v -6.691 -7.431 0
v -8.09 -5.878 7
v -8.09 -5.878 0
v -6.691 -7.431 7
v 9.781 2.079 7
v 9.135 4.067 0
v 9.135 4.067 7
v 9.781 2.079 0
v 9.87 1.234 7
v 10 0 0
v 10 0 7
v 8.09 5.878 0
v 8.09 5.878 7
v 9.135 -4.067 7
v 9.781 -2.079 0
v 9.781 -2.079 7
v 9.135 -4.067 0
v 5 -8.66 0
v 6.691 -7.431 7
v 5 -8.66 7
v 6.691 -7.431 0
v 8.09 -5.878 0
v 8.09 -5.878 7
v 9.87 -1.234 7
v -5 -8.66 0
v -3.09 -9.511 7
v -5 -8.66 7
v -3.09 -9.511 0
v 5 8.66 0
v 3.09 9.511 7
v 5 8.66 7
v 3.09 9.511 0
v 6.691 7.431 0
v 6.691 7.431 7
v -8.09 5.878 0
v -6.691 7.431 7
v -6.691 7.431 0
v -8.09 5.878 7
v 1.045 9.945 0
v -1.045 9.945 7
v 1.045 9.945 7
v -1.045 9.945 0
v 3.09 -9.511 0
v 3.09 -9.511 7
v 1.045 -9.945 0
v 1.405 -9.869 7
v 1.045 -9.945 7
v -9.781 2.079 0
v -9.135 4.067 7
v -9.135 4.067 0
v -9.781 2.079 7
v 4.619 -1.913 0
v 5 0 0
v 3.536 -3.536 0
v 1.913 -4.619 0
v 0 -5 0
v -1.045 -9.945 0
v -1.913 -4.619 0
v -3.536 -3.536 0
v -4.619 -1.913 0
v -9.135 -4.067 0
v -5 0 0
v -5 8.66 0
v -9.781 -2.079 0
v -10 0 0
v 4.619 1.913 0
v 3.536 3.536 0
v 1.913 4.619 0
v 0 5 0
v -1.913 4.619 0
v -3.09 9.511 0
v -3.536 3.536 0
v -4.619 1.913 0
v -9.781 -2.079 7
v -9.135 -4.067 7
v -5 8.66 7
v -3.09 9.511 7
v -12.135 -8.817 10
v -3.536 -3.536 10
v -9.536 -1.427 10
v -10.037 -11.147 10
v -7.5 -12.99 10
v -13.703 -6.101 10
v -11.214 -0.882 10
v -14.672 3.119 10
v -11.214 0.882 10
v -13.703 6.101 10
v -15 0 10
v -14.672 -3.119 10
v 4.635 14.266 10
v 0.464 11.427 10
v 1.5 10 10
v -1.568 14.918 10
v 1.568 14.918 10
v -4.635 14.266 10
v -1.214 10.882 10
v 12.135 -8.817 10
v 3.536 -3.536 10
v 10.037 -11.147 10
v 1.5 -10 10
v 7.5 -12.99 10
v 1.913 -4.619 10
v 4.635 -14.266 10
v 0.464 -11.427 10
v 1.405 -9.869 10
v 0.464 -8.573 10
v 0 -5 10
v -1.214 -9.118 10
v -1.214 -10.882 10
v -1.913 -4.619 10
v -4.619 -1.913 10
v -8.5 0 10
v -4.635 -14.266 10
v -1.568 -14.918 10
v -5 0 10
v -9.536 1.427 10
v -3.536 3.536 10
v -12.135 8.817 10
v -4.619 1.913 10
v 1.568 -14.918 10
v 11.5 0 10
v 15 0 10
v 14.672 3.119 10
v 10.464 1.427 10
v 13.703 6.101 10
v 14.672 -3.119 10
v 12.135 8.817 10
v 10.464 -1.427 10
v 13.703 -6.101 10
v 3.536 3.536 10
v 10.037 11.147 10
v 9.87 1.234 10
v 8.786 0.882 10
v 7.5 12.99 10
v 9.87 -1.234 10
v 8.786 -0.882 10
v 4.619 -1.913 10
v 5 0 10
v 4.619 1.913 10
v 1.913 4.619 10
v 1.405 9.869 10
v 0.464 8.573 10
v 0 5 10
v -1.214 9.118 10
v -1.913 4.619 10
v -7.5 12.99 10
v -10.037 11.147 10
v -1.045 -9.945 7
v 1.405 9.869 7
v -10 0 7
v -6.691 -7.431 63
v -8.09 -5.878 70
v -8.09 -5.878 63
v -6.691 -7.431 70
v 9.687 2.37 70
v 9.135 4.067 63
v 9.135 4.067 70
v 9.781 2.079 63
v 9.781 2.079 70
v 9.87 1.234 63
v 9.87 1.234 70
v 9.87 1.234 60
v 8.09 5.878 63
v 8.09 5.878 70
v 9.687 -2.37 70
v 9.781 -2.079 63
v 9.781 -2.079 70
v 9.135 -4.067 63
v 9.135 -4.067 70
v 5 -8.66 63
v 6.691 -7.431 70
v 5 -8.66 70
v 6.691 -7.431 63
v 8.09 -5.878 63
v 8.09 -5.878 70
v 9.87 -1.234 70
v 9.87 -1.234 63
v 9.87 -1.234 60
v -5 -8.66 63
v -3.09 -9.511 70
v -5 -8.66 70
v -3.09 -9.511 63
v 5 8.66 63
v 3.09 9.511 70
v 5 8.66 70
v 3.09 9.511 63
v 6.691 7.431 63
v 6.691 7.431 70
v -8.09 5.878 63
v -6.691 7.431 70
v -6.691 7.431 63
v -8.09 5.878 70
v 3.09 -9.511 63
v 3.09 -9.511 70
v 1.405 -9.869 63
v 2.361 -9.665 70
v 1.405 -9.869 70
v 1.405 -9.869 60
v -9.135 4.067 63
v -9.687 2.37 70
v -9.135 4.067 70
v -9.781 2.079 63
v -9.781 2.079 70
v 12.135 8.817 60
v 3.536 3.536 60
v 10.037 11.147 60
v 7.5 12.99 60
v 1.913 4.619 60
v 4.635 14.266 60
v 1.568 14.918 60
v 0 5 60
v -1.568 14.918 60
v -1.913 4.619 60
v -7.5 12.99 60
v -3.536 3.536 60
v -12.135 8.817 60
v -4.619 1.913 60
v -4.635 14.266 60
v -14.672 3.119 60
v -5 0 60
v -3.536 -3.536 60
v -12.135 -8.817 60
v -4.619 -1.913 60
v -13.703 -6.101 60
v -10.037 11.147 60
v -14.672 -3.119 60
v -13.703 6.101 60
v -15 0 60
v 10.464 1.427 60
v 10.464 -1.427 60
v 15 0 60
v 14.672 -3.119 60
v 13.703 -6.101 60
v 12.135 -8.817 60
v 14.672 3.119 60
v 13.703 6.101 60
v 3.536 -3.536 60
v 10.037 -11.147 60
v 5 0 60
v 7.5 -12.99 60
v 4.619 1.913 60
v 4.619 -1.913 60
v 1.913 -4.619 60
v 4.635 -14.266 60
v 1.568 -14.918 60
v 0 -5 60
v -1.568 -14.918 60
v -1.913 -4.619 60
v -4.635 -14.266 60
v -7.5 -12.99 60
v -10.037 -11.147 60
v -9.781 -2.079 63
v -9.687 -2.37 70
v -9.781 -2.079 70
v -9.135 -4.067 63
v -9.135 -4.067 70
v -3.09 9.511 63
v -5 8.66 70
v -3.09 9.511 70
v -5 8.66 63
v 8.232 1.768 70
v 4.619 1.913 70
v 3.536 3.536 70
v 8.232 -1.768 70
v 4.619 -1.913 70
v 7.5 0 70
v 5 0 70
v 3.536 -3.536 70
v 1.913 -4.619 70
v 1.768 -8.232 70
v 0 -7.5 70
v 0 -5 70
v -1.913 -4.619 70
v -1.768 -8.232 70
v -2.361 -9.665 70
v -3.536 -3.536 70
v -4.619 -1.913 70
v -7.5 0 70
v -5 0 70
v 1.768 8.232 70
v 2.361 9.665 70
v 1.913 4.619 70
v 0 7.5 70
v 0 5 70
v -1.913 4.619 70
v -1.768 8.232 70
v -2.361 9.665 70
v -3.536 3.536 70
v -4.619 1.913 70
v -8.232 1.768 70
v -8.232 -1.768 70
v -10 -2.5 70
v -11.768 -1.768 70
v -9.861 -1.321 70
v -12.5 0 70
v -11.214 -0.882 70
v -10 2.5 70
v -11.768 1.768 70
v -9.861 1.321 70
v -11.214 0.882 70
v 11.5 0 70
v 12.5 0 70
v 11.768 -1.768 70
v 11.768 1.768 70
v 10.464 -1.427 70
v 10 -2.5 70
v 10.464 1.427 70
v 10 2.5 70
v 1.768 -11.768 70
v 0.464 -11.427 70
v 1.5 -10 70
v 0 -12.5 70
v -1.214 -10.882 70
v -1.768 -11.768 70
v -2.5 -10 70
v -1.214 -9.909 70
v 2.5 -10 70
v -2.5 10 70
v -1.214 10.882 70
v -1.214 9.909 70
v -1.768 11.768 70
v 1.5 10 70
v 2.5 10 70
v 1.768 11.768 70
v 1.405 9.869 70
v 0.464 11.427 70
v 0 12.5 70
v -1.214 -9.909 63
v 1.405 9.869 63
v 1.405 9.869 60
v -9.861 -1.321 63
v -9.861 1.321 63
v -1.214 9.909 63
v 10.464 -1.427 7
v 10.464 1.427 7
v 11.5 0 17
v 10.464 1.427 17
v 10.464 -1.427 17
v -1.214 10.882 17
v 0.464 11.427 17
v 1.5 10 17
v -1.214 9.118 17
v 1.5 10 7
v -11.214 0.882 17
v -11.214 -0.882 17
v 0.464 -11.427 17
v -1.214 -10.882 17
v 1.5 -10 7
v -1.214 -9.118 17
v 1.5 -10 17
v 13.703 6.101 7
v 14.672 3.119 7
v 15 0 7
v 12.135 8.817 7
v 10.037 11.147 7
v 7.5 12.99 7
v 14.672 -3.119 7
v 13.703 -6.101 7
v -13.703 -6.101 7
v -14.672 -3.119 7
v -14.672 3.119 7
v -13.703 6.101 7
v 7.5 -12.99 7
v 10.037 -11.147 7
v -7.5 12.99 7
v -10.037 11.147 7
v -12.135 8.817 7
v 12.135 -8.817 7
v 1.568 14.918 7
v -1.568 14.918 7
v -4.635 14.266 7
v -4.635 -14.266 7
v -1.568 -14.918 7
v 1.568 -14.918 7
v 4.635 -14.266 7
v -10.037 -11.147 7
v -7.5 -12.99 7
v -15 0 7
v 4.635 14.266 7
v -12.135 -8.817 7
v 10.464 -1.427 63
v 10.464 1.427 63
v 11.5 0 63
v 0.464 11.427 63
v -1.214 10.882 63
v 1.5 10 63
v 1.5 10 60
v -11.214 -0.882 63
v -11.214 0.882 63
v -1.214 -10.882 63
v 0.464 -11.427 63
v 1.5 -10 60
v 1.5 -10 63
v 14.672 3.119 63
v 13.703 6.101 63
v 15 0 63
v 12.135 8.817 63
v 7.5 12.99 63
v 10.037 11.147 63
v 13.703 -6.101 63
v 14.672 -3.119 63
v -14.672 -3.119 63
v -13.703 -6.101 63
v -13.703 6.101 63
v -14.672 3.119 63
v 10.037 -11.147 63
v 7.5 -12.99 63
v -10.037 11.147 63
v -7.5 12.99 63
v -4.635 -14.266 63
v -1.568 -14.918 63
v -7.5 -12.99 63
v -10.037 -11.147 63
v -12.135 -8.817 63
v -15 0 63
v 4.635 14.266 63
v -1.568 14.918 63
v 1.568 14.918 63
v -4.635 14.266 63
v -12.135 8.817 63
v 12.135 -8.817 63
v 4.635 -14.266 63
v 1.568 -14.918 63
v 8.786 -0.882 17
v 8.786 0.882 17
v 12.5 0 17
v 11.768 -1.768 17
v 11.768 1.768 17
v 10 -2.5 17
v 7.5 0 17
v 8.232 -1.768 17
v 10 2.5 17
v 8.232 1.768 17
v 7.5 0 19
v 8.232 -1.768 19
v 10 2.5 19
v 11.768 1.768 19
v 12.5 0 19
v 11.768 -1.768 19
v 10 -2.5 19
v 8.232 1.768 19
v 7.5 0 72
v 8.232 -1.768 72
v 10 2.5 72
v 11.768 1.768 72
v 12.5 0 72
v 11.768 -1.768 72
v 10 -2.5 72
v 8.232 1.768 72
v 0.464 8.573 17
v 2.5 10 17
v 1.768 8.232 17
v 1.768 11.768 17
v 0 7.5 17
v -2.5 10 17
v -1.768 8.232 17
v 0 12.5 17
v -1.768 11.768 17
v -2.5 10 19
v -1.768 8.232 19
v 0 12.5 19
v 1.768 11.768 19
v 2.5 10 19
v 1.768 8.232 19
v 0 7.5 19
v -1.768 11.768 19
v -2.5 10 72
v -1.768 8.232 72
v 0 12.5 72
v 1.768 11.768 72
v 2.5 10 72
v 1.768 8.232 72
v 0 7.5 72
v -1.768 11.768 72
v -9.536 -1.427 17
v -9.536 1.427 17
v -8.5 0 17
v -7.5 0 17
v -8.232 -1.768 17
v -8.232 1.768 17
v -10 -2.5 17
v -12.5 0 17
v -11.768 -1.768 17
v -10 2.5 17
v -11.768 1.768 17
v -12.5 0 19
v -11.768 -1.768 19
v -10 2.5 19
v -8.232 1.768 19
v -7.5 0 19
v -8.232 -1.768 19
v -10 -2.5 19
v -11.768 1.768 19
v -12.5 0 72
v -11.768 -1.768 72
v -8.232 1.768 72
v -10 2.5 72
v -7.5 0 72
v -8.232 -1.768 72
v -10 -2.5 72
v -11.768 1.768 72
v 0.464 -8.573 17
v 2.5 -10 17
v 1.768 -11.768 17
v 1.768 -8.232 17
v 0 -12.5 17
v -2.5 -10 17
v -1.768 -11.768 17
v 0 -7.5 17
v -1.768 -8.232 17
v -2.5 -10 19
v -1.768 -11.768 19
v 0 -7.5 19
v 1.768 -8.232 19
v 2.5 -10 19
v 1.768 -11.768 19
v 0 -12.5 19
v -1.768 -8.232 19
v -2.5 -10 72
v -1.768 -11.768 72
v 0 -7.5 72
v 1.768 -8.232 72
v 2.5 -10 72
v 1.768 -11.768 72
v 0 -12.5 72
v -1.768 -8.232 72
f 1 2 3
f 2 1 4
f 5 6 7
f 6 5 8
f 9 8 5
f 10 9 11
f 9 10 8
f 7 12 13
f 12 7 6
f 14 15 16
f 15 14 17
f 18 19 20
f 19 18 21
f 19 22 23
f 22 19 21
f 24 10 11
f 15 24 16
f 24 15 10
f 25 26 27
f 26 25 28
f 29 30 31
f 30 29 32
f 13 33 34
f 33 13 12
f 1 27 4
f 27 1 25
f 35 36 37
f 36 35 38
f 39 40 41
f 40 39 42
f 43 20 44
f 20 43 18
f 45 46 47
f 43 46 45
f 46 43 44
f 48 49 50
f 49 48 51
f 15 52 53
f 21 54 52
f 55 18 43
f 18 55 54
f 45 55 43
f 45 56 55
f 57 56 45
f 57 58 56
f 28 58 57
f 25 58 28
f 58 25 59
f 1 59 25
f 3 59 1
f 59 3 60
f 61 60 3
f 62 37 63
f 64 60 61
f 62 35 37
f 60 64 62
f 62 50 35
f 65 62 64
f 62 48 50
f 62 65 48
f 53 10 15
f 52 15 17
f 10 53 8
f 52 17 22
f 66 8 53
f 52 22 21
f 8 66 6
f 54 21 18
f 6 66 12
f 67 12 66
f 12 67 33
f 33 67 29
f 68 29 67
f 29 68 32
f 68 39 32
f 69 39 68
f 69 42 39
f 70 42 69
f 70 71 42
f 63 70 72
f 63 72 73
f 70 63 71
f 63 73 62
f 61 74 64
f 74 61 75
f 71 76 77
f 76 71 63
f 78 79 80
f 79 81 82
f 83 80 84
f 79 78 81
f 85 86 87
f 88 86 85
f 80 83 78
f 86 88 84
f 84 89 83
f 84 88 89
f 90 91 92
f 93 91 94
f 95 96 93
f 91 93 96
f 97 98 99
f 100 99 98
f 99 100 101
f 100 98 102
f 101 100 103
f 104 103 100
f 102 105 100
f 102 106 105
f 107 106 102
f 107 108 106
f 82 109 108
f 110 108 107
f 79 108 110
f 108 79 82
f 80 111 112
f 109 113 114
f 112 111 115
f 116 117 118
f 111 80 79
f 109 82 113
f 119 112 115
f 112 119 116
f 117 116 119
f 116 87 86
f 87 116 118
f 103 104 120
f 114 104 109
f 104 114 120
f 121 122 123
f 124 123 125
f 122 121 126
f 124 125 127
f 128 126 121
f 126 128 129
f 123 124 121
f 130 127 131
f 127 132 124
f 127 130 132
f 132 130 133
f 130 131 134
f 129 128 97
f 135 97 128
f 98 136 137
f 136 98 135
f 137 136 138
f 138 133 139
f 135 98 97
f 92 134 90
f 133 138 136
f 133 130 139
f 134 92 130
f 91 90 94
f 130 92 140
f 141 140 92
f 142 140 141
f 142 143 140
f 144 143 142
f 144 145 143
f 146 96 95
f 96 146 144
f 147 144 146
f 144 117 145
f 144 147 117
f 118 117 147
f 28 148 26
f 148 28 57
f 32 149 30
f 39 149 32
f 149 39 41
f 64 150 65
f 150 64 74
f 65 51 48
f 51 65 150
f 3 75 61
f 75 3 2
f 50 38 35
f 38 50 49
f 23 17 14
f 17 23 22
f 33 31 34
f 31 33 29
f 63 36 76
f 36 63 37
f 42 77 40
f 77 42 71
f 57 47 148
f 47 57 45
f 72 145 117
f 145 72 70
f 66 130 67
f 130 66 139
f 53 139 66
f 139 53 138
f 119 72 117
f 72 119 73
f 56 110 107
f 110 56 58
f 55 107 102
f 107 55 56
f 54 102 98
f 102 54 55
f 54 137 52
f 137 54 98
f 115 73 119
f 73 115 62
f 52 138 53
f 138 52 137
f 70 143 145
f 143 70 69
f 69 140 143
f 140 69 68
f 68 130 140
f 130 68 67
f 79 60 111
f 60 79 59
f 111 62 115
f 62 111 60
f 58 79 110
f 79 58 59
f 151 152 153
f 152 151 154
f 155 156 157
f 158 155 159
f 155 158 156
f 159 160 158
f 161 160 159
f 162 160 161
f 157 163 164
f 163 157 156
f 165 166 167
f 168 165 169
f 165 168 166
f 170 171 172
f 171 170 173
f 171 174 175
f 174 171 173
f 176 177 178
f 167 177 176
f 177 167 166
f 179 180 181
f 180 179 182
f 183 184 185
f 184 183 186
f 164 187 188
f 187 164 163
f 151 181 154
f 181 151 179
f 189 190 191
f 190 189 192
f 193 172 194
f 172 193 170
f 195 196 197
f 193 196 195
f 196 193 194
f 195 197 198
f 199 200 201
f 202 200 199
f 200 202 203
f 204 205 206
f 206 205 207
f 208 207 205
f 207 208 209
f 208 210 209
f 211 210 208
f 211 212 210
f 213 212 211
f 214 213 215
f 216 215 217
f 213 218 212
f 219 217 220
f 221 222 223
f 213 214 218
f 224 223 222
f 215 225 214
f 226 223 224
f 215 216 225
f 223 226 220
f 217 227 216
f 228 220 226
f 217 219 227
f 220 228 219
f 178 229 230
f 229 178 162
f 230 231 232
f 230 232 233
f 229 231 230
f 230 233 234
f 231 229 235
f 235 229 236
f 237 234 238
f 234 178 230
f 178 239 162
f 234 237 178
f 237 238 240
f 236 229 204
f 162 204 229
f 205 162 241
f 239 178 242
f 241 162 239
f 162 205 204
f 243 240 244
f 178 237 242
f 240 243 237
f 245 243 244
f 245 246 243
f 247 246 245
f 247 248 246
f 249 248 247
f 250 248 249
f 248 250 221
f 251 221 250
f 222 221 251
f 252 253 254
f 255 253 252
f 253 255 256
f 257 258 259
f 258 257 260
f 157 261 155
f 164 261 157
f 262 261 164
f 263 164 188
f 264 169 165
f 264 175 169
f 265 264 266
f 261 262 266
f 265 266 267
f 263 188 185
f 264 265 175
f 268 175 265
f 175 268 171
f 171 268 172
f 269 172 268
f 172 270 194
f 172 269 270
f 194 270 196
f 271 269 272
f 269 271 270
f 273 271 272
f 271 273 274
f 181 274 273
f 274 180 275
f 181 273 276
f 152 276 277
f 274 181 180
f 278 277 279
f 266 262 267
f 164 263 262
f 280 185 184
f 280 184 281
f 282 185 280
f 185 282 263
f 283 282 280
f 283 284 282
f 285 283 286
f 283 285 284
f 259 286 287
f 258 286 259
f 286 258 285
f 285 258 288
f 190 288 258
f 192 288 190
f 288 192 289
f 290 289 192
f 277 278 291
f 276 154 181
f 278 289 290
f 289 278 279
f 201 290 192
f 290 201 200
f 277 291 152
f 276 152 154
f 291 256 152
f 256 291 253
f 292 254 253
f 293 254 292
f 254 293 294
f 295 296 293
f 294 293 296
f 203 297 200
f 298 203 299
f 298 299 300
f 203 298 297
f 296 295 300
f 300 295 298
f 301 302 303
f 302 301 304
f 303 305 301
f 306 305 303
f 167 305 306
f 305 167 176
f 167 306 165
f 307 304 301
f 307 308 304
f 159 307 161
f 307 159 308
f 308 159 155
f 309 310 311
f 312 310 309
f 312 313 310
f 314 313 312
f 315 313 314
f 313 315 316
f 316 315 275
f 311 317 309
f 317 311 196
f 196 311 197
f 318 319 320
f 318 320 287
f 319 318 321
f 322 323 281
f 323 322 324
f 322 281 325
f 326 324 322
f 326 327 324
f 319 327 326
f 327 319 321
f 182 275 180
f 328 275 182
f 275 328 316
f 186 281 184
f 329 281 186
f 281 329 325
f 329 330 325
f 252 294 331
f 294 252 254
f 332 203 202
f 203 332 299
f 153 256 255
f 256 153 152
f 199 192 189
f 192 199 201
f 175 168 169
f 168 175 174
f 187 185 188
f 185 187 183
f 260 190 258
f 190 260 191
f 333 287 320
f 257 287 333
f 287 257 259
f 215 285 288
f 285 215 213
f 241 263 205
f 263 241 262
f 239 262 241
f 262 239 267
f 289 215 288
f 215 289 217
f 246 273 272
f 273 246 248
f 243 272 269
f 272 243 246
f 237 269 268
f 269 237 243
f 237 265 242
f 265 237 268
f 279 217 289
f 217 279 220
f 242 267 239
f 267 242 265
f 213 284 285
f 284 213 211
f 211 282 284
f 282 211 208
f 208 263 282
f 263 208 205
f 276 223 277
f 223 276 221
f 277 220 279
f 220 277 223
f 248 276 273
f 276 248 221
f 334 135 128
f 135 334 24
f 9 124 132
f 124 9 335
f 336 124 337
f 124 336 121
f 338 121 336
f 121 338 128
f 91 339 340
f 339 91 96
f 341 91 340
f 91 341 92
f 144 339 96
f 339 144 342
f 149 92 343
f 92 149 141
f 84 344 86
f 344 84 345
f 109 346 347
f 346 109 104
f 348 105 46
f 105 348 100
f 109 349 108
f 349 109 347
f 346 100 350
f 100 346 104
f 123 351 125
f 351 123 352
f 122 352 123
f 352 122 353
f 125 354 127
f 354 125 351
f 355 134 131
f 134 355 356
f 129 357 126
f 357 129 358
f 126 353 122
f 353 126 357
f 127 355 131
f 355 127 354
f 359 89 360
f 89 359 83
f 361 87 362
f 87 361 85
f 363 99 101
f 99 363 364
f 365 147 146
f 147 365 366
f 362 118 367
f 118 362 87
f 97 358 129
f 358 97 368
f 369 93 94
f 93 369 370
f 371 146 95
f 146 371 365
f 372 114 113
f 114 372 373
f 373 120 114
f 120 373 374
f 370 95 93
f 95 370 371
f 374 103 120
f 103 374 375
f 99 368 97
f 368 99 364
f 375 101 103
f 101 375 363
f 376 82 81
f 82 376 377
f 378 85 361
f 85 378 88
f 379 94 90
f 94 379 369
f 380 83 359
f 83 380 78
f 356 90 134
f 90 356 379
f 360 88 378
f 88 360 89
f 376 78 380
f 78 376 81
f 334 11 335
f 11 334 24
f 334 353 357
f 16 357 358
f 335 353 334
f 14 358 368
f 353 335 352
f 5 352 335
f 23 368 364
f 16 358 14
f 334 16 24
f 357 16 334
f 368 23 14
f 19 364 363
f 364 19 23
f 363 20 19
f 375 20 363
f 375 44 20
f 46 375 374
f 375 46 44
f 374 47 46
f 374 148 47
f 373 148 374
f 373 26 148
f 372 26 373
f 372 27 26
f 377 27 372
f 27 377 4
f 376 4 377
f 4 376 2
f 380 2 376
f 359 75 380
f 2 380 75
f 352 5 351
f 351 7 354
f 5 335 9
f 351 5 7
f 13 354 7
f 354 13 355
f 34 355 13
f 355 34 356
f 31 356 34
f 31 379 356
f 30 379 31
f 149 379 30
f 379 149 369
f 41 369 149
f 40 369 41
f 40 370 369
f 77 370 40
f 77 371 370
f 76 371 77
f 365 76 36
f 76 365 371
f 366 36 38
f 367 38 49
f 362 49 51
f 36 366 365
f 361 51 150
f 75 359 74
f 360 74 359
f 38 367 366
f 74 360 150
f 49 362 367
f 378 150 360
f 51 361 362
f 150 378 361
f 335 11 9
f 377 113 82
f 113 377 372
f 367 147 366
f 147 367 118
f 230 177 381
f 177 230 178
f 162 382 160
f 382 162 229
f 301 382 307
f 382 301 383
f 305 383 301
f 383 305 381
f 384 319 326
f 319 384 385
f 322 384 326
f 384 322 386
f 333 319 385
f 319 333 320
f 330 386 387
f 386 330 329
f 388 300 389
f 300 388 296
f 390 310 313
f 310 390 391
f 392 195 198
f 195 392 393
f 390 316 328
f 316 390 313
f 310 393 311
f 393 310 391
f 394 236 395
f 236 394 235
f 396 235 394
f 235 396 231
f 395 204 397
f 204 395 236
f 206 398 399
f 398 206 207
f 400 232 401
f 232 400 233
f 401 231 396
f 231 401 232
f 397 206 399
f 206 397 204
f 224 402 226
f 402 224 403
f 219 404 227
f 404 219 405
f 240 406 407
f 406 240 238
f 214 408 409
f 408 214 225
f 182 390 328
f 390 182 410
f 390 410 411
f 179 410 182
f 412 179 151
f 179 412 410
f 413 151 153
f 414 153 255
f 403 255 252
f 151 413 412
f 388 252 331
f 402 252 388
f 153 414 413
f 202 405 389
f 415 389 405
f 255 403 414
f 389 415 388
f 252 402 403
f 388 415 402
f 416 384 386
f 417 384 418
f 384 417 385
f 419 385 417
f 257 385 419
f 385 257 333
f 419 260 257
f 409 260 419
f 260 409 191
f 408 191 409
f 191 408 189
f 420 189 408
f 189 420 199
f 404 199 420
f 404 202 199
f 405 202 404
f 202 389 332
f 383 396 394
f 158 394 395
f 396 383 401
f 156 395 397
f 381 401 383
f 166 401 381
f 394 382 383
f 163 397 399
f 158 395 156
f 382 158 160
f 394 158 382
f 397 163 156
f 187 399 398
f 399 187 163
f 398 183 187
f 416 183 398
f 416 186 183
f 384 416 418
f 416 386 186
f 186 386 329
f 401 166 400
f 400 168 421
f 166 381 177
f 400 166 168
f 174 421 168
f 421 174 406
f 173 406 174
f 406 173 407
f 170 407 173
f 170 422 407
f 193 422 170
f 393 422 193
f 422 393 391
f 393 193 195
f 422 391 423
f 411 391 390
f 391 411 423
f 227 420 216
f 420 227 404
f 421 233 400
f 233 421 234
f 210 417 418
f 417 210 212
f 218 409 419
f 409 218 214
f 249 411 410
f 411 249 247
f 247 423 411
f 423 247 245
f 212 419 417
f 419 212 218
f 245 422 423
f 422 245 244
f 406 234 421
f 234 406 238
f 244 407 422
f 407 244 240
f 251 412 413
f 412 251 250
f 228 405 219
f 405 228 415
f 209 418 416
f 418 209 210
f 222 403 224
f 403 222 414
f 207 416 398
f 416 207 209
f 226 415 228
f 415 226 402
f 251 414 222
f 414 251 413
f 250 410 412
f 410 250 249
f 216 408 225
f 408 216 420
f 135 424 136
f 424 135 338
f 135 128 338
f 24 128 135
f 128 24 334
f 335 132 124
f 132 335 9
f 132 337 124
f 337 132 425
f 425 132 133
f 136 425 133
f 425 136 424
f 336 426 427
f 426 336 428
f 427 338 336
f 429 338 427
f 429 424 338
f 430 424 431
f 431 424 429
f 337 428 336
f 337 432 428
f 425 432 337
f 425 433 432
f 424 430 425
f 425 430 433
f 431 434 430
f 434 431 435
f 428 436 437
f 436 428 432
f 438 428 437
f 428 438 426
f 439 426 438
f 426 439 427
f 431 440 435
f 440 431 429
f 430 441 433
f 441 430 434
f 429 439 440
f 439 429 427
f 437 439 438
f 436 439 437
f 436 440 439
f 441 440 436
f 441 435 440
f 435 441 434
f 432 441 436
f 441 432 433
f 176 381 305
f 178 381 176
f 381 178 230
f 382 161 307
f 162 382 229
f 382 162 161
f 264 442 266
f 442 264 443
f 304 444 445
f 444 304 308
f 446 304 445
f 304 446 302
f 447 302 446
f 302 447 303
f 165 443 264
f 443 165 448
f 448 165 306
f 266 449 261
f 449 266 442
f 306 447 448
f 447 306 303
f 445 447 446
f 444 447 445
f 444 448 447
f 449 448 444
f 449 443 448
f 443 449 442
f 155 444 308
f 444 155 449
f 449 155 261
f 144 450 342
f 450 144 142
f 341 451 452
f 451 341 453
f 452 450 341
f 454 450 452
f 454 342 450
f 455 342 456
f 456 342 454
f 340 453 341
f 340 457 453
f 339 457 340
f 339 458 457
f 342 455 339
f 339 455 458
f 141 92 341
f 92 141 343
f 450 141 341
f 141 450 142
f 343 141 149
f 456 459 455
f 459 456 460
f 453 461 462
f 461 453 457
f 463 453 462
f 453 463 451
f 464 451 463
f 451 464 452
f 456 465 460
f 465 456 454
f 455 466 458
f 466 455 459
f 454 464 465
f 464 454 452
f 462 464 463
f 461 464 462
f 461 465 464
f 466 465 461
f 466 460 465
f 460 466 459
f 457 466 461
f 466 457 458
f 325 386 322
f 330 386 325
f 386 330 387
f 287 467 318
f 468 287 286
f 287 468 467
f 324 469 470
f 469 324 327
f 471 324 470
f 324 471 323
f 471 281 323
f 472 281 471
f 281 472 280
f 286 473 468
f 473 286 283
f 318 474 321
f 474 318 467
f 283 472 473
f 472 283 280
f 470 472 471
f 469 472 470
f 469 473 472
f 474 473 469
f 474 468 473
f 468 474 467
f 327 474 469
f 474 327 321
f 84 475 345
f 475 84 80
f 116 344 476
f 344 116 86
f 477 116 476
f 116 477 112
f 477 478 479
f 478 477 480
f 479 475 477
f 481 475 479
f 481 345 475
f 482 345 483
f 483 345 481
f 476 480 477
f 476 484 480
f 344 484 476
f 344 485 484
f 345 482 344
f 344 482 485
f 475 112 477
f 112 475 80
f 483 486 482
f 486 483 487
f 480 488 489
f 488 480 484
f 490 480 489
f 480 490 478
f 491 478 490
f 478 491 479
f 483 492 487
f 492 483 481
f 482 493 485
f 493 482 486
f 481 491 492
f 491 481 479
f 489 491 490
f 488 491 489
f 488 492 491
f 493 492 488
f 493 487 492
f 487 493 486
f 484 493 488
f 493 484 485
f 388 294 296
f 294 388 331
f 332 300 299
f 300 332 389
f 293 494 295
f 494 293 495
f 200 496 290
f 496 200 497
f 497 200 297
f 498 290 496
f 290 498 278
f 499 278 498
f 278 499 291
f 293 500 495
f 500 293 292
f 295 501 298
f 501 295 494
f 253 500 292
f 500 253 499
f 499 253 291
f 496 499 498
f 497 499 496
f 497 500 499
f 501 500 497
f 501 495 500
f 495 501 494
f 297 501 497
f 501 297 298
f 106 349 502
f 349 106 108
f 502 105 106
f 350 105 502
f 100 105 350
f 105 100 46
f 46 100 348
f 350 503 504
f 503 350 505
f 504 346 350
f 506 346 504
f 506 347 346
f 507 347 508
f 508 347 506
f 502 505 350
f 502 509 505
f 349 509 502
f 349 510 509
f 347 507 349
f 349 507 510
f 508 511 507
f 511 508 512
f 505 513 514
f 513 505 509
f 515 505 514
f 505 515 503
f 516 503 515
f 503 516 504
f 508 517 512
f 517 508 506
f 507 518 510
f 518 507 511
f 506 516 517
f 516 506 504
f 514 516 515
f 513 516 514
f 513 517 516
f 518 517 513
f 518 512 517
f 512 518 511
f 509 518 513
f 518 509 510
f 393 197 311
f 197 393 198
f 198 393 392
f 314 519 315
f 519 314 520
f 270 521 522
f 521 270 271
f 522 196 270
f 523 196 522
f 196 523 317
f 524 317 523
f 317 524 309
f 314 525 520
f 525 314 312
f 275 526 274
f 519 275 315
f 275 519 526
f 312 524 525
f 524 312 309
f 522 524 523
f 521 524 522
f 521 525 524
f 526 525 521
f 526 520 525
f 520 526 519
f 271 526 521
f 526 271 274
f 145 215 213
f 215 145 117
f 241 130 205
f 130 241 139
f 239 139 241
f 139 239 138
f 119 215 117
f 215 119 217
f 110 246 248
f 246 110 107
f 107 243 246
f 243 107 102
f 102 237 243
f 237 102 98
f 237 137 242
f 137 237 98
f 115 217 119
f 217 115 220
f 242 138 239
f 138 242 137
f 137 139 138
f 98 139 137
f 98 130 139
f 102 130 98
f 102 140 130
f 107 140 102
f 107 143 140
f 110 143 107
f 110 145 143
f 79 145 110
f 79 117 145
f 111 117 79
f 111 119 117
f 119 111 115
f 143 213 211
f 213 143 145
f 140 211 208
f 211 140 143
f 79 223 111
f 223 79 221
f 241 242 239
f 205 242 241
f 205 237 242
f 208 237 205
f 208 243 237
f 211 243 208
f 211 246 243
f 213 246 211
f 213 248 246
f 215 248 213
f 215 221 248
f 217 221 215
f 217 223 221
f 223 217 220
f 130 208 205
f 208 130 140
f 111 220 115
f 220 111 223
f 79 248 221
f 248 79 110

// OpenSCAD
// Parameters
shaft_length = 50;
shaft_radius = 5;
hub_radius = 10;
hub_length = 10;
flange_radius = 15;
flange_thickness = 3;
bolt_radius = 1.5;
bolt_length = 10;
nut_radius = 2.5;
nut_thickness = 2;
bolt_hole_offset = 10;
num_bolts = 4;

// Function to create a bolt
module bolt() {
    cylinder(h = bolt_length, r = bolt_radius);
    translate([0, 0, bolt_length])
        cylinder(h = nut_thickness, r = nut_radius);
}

// Function to create a flange plate
module flange_plate() {
    difference() {
        cylinder(h = flange_thickness, r = flange_radius);
        cylinder(h = flange_thickness + 1, r = shaft_radius);
        for (i = [0:num_bolts-1]) {
            angle = i * 360 / num_bolts;
            translate([bolt_hole_offset * cos(angle), bolt_hole_offset * sin(angle), -0.5])
                cylinder(h = flange_thickness + 1, r = bolt_radius);
        }
    }
}

// Function to create a hub
module hub() {
    difference() {
        cylinder(h = hub_length, r = hub_radius);
        cylinder(h = hub_length + 1, r = shaft_radius);
    }
}

// Function to create the central shaft
module central_shaft() {
    cylinder(h = shaft_length, r = shaft_radius);
}

// Function to assemble the coupling
module coupling() {
    // Central shaft
    translate([0, 0, hub_length])
        central_shaft();

    // Input hub
    hub();

    // Output hub
    translate([0, 0, shaft_length + hub_length])
        hub();

    // Flange plates
    translate([0, 0, hub_length - flange_thickness])
        flange_plate();
    translate([0, 0, shaft_length + hub_length])
        flange_plate();

    // Bolts and nuts
    for (i = [0:num_bolts-1]) {
        angle = i * 360 / num_bolts;
        translate([bolt_hole_offset * cos(angle), bolt_hole_offset * sin(angle), hub_length - flange_thickness])
            bolt();
        translate([bolt_hole_offset * cos(angle), bolt_hole_offset * sin(angle), shaft_length + hub_length])
            bolt();
    }
}

// Render the coupling
coupling();
